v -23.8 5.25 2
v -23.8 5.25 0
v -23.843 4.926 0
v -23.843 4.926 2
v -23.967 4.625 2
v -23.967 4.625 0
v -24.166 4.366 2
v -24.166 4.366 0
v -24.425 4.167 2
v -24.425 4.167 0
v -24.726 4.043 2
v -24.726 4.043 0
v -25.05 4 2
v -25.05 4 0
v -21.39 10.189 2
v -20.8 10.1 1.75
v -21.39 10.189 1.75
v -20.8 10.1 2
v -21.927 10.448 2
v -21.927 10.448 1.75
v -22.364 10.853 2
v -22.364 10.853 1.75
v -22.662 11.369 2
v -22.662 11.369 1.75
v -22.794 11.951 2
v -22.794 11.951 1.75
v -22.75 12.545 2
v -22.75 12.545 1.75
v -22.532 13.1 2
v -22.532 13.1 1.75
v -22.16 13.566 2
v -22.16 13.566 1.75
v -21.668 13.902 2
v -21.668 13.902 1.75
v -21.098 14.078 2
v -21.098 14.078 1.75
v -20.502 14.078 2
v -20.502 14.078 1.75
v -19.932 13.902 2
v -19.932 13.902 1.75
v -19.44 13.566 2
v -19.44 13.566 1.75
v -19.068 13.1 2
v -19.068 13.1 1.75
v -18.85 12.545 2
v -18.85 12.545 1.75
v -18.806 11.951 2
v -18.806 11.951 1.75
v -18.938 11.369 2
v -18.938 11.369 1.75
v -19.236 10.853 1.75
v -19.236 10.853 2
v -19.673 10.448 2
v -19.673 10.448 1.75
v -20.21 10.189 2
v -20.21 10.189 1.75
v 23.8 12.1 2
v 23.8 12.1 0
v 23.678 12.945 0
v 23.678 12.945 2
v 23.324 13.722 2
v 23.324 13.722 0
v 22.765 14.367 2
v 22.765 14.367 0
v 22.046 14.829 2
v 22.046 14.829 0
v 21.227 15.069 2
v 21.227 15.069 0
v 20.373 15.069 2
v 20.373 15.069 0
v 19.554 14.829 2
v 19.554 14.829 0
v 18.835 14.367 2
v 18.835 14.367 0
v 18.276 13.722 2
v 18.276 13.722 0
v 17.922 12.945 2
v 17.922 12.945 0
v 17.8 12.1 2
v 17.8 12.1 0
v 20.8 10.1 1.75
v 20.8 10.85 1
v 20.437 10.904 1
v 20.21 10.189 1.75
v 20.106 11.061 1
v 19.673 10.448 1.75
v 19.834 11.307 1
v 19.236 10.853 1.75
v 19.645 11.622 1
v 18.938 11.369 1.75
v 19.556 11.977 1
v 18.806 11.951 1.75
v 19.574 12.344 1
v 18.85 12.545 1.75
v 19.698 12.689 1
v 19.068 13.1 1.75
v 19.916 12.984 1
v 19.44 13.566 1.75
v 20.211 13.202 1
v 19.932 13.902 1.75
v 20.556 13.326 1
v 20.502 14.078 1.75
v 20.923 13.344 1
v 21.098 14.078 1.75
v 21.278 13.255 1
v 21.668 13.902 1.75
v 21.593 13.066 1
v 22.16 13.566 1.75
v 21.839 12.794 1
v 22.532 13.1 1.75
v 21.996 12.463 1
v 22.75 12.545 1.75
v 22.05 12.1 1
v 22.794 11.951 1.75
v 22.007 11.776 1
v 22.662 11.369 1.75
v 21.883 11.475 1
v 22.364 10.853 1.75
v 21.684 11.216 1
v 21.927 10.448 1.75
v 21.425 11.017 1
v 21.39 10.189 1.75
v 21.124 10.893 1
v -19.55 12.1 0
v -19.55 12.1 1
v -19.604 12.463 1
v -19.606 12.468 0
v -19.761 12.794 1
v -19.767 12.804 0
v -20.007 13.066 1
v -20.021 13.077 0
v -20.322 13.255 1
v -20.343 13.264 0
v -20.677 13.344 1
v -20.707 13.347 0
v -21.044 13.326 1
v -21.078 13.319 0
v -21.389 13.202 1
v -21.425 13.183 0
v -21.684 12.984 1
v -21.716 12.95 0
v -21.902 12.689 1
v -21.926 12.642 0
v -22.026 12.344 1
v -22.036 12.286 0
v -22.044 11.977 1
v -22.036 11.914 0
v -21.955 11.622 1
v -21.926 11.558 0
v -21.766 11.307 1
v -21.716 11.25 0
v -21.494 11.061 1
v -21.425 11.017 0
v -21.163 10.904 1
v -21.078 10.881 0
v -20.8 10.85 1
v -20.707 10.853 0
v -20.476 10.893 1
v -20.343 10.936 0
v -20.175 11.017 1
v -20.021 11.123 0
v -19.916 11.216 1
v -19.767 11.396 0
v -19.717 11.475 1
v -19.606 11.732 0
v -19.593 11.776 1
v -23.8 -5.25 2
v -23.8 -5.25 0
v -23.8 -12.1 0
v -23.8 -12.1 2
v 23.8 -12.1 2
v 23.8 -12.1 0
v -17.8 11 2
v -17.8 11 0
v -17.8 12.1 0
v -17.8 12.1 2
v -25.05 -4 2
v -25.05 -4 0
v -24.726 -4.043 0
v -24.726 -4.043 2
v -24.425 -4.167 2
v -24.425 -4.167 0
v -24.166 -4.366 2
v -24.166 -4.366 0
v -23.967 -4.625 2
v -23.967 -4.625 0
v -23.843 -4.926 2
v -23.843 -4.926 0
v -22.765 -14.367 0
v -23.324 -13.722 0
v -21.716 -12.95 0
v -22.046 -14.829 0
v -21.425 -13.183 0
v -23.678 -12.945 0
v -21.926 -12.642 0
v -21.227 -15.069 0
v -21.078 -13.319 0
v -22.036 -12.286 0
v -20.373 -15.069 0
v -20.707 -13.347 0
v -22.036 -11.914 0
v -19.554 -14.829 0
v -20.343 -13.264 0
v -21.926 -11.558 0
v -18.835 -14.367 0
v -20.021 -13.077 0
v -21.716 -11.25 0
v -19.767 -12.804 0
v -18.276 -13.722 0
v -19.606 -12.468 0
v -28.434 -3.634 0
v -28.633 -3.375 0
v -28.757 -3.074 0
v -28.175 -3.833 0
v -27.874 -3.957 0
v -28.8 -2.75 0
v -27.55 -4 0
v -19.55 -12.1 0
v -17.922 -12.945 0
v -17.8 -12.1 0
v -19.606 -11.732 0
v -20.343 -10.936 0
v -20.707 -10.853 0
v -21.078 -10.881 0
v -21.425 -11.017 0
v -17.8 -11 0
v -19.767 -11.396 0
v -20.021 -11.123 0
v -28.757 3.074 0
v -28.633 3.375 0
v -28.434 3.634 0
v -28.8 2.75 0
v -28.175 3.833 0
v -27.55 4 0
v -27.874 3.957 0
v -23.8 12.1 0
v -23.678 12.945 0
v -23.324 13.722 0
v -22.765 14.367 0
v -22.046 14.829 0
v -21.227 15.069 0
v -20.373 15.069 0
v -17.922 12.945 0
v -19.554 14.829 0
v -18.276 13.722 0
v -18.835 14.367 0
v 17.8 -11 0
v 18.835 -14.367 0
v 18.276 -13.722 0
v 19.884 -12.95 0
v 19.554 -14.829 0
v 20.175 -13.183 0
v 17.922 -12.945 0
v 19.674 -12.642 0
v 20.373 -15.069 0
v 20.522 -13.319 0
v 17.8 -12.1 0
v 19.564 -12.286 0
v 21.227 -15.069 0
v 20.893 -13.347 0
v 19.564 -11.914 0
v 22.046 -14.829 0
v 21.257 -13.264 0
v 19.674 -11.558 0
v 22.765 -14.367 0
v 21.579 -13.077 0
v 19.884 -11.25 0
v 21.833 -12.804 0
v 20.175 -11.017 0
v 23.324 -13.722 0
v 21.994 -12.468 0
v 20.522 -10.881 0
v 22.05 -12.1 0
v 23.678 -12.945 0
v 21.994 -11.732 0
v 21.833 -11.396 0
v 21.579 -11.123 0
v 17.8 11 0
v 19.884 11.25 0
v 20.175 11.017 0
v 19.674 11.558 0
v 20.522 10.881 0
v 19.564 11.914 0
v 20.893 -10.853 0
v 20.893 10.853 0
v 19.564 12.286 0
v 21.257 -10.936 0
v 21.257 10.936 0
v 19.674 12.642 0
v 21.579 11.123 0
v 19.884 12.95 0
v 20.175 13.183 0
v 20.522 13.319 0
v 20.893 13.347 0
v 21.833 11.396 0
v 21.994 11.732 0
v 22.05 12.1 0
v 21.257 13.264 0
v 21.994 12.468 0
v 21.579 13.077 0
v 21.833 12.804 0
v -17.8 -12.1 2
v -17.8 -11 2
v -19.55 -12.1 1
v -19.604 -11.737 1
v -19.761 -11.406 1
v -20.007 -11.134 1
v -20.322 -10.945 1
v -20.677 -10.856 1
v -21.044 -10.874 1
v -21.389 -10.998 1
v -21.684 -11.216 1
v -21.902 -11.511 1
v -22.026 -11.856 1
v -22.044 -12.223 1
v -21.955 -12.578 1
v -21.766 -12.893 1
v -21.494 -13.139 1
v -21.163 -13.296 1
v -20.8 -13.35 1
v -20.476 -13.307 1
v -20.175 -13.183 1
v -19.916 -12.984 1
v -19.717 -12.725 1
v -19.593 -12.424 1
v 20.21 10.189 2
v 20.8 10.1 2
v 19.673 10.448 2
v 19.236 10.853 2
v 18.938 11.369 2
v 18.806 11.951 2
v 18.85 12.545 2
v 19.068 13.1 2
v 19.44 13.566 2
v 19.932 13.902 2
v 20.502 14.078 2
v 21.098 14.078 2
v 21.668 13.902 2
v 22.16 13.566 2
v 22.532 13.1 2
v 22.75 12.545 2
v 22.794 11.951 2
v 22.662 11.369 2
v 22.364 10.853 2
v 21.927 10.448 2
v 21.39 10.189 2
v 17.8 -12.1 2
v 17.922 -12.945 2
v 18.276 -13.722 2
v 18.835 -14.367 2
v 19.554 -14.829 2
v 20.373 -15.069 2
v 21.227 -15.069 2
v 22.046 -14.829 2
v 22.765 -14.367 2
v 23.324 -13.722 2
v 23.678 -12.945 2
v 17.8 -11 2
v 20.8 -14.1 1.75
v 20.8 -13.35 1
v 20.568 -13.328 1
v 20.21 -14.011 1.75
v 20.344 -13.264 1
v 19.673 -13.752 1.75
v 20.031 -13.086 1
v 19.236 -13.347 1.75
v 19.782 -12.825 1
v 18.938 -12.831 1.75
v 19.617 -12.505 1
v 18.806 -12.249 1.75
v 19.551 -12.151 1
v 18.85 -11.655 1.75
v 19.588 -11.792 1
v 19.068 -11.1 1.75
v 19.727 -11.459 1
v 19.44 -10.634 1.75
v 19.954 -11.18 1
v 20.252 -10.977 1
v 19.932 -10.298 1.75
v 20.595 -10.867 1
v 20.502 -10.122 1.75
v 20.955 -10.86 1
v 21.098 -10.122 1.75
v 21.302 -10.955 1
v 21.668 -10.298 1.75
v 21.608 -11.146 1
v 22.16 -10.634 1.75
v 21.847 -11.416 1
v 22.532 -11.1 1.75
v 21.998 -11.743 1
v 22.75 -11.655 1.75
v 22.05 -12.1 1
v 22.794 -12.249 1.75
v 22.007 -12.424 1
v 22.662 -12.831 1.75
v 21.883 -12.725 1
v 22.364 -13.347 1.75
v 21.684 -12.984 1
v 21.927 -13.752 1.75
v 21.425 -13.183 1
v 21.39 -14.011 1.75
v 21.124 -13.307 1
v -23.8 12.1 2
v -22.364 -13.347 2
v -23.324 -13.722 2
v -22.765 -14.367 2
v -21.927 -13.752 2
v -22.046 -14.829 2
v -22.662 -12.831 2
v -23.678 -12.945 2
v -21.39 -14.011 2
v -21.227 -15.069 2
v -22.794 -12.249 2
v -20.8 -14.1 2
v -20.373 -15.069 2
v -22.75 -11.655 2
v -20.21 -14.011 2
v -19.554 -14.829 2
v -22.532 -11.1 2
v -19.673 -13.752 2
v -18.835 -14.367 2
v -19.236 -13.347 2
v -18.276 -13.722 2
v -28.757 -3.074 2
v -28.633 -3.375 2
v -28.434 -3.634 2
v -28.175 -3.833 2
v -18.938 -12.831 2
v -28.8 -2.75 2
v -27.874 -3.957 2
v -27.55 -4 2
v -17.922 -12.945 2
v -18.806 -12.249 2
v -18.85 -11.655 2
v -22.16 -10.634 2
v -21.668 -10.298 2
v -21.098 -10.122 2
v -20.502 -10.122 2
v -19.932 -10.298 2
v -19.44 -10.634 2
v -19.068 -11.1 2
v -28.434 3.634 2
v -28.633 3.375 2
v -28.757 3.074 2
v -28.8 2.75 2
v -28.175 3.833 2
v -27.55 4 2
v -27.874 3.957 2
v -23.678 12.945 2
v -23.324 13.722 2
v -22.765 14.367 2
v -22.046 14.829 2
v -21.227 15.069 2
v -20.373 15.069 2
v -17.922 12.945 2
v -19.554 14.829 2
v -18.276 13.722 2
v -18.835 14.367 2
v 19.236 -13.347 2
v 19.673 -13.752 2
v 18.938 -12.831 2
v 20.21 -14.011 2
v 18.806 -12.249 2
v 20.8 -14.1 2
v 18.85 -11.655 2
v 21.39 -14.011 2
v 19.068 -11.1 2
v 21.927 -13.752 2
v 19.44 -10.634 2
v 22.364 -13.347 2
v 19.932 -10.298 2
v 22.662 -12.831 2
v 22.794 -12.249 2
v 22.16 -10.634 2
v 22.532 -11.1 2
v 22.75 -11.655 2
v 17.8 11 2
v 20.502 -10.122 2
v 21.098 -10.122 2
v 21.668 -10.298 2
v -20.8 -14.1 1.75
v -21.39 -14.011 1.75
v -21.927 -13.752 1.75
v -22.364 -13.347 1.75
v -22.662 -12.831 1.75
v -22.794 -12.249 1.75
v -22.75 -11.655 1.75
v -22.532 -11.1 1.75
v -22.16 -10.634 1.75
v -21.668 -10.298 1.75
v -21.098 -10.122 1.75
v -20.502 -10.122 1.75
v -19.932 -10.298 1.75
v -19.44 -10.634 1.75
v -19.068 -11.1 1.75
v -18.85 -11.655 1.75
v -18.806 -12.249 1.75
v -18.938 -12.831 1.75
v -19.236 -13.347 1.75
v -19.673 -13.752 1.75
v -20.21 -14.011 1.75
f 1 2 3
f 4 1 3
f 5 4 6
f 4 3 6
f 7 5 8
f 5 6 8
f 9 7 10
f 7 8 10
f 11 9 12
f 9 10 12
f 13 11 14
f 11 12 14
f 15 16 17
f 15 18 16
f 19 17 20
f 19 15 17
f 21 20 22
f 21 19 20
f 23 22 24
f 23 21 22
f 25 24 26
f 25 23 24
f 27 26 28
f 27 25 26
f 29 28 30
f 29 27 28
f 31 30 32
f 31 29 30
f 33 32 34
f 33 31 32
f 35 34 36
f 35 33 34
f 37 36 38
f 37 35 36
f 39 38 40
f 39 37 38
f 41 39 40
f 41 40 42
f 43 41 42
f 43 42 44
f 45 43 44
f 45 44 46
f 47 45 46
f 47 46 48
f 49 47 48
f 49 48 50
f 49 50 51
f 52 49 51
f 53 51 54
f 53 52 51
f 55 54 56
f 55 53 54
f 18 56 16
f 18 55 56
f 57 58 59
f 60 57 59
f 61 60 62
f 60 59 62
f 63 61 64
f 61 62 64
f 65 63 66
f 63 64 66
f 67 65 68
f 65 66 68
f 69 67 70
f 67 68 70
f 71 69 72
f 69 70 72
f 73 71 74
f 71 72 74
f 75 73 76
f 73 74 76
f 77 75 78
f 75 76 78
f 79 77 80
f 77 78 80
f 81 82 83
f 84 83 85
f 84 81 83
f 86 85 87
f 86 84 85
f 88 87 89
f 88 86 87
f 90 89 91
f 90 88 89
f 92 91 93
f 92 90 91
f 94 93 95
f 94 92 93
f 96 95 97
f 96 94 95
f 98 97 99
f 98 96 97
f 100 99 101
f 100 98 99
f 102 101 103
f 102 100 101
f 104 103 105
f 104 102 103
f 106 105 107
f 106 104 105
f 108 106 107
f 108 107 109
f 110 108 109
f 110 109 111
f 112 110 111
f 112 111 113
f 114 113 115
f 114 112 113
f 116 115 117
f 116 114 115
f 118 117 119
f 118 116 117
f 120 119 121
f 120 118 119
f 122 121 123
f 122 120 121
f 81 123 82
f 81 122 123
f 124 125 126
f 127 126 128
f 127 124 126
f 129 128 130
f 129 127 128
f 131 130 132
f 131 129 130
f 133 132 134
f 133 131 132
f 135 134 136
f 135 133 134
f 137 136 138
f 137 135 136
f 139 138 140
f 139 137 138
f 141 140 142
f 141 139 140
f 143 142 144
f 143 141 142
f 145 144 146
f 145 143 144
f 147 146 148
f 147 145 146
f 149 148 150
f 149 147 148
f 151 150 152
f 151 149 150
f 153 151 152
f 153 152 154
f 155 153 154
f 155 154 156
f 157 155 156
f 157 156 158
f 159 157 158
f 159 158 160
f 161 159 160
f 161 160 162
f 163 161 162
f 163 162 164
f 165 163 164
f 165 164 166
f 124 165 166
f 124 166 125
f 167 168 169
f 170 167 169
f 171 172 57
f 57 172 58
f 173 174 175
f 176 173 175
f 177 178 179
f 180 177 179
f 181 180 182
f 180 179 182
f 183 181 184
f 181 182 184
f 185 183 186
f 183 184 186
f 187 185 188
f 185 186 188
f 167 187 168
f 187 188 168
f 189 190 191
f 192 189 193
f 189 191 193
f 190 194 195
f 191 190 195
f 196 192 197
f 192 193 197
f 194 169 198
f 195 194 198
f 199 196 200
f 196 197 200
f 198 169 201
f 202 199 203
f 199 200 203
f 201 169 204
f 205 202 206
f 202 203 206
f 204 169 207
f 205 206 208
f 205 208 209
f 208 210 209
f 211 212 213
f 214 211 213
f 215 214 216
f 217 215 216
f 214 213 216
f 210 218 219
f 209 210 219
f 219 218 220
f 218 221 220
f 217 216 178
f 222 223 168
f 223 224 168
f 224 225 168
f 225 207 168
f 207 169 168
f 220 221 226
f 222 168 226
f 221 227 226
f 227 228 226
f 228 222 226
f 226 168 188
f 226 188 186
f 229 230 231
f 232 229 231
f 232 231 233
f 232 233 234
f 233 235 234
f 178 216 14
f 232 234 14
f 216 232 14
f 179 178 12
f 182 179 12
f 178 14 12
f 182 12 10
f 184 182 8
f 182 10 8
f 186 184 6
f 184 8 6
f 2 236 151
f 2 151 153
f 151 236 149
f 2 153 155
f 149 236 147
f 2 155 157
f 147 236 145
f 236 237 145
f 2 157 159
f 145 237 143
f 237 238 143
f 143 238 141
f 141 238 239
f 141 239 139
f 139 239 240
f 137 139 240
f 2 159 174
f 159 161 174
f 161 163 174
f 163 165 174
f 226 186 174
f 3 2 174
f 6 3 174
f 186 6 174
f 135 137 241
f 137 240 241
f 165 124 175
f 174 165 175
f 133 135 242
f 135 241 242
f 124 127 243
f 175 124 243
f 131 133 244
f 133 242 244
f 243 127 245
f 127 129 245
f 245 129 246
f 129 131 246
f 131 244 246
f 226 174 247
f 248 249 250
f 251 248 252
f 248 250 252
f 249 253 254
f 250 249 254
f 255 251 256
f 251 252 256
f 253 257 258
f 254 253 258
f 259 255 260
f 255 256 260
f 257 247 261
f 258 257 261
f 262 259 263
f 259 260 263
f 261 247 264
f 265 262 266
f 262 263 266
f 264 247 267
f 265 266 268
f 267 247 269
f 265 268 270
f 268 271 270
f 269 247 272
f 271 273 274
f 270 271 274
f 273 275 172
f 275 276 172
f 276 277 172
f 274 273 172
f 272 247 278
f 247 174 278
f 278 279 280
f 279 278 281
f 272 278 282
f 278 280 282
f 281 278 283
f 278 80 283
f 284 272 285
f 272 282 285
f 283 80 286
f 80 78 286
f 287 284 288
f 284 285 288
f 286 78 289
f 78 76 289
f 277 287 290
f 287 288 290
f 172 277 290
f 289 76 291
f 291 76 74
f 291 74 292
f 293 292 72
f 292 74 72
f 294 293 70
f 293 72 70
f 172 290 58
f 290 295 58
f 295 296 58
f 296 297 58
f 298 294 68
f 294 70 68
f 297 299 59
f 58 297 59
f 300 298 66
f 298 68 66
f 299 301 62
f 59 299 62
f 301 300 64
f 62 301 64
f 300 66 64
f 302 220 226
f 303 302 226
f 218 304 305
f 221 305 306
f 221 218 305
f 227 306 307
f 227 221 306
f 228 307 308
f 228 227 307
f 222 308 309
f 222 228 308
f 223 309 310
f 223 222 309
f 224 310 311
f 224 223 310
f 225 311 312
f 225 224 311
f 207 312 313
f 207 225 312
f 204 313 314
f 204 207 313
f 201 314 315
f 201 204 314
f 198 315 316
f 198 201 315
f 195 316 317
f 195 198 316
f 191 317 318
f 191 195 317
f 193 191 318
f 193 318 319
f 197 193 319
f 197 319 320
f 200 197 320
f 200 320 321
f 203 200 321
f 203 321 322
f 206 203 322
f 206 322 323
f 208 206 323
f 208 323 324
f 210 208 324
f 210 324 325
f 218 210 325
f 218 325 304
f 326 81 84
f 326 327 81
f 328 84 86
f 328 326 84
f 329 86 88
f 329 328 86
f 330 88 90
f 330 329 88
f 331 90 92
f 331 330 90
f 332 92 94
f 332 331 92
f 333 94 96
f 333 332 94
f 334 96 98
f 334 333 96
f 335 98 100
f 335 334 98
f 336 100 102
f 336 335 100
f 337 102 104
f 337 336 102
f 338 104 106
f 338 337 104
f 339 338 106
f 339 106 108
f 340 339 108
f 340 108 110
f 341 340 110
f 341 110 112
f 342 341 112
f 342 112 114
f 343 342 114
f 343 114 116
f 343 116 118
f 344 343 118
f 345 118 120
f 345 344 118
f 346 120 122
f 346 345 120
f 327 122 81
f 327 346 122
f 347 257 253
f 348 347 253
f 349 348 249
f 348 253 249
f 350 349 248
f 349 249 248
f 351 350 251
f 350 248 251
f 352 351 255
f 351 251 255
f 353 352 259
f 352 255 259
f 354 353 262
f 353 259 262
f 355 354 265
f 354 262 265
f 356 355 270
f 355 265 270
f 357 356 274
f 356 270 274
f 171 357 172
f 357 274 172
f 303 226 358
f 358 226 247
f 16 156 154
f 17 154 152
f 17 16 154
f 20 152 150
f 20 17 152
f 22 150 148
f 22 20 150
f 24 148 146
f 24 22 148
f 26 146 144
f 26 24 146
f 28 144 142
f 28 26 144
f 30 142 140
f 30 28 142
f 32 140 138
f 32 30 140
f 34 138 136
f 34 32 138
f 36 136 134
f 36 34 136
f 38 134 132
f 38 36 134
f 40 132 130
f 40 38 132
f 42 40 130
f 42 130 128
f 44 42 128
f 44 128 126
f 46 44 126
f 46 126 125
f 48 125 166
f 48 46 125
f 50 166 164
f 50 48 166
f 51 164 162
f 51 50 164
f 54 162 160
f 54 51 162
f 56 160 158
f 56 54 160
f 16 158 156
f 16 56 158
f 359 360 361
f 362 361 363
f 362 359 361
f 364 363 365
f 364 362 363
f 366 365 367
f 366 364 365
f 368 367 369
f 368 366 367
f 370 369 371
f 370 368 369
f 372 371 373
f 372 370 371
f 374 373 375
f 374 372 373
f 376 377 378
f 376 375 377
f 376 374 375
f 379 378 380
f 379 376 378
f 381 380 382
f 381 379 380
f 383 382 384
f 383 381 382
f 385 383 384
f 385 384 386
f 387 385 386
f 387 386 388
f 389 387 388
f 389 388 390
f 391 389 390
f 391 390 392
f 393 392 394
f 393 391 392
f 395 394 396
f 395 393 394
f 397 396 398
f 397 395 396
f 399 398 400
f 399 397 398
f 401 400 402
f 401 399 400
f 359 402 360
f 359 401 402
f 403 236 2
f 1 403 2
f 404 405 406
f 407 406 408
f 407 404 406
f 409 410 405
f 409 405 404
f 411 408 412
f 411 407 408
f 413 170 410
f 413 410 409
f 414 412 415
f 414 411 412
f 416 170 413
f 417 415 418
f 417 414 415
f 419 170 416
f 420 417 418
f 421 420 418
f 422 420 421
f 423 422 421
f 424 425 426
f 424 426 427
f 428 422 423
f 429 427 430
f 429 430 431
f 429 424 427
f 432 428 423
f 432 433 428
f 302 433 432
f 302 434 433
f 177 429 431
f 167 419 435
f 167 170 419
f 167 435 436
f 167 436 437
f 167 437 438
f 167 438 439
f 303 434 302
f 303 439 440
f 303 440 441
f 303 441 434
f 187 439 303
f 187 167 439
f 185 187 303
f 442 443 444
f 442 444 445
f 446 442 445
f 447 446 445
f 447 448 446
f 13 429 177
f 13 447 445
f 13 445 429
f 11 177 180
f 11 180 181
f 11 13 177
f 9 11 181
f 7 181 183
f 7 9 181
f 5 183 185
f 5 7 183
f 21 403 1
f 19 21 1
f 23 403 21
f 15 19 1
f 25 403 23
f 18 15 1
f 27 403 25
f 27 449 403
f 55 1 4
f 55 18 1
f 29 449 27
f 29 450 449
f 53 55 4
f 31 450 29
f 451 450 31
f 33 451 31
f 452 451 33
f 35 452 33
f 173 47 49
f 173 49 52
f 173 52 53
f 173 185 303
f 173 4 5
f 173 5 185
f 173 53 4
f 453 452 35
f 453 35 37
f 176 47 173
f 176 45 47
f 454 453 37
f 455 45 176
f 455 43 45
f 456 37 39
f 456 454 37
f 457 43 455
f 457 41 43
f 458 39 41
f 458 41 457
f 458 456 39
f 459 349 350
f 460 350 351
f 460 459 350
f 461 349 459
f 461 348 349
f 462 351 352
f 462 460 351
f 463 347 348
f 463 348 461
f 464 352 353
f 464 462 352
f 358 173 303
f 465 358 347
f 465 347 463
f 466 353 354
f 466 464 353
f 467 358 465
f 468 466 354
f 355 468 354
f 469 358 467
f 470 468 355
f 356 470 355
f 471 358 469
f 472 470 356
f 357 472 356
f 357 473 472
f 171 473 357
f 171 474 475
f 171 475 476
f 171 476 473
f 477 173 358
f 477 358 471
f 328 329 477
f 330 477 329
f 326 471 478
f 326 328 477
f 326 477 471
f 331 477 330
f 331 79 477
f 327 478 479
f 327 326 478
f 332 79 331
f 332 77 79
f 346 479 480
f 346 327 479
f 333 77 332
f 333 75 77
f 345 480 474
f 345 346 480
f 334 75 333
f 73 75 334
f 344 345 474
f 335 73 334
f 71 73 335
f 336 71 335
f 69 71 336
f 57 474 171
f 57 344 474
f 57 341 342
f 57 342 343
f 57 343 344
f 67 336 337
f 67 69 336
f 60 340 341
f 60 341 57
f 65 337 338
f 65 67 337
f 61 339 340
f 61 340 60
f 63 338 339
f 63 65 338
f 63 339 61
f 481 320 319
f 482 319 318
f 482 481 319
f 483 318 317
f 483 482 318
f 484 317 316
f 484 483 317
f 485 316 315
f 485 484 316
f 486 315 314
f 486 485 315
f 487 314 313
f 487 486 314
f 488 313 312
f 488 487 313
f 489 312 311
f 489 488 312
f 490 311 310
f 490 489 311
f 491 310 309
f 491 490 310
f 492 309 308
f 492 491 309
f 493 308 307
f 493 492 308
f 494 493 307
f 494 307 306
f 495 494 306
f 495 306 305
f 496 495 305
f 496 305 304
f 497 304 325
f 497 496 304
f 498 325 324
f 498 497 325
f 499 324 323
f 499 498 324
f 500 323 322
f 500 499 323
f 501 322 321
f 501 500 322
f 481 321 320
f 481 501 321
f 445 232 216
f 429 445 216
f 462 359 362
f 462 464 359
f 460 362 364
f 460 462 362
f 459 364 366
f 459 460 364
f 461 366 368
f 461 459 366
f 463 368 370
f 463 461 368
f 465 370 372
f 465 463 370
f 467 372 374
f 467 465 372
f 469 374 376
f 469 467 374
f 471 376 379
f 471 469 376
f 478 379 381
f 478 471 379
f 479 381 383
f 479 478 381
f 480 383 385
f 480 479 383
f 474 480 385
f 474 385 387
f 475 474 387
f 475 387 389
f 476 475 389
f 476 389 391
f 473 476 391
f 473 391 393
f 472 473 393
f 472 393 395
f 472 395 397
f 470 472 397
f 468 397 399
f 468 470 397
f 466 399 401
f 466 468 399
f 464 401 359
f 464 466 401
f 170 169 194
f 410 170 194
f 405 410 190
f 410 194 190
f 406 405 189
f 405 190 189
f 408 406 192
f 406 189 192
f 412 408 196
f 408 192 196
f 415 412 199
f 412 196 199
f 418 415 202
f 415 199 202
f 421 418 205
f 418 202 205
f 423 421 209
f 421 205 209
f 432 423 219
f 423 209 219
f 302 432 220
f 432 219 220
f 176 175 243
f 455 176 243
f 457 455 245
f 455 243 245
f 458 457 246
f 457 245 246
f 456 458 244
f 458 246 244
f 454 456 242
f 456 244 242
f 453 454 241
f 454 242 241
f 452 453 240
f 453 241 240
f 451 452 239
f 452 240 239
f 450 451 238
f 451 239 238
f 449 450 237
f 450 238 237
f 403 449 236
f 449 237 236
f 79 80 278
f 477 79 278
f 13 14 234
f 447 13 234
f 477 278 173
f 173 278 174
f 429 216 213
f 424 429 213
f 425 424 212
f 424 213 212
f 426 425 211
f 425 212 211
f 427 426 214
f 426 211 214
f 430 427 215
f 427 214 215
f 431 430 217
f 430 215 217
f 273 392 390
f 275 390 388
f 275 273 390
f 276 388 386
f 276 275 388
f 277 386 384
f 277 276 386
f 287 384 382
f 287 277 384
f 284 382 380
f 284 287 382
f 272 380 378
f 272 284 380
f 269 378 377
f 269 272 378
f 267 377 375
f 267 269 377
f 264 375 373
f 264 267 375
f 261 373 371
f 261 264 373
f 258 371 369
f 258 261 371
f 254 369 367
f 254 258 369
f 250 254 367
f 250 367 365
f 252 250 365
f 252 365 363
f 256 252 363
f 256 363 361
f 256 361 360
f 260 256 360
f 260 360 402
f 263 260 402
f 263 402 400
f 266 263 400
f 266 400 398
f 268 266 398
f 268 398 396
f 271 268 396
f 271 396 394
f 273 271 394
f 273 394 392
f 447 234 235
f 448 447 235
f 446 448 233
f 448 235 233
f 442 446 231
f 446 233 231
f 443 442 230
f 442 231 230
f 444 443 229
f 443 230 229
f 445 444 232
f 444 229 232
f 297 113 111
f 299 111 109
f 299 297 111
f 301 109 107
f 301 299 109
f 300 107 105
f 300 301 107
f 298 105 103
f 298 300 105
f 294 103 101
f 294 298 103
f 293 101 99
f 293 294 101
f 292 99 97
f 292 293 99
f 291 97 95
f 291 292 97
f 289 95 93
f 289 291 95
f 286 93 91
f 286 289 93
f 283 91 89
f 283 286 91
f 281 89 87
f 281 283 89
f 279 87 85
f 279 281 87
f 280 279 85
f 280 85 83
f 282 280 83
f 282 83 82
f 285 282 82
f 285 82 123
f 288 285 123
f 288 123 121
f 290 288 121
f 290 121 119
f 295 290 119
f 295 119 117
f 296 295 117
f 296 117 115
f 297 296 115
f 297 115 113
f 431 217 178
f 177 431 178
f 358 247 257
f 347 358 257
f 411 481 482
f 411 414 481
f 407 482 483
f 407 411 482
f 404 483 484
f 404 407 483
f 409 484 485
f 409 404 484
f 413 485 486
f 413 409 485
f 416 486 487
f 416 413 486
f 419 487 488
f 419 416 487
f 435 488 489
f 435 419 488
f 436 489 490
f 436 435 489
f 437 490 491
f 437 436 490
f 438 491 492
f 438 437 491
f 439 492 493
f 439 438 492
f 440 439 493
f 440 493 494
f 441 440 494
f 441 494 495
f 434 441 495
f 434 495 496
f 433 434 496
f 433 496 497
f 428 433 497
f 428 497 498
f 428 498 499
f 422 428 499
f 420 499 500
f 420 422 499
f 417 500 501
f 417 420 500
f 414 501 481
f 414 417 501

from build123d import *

# Parameters (mm, degrees)
SKETCH1_R                                      = 1.25
BOSS_EXTRUDE1_DEPTH                            = 2
CSK_FOR_M2_FLAT_HEAD_MACHINE_SCREW1_AT_2_COUNT = 2
CSK_FOR_M2_FLAT_HEAD_MACHINE_SCREW1_AT_2_PITCH = 41.6
CSK_FOR_M2_FLAT_HEAD_MACHINE_SCREW1_AT_3_COUNT = 2
CSK_FOR_M2_FLAT_HEAD_MACHINE_SCREW1_AT_3_PITCH = 48.126915546
CSK_FOR_M2_FLAT_HEAD_MACHINE_SCREW1_AT_4_COUNT = 2
CSK_FOR_M2_FLAT_HEAD_MACHINE_SCREW1_AT_4_PITCH = 24.2


with BuildPart() as part:
    # Sketch1 → Boss-Extrude1 (new body)
    with BuildSketch(Plane.XY):
        with BuildLine():
            Line((-28.8, 2.25), (-28.8, -2.25))
            Line((-28.8, -2.25), (-28.8, -2.75))
            ThreePointArc((-28.8, -2.75), (-28.433883476, -3.633883476), (-27.55, -4))
            Line((-27.55, -4), (-25.05, -4))
            ThreePointArc((-25.05, -4), (-24.166116524, -4.366116524), (-23.8, -5.25))
            Line((-23.8, -5.25), (-23.8, -12.1))
            ThreePointArc((-23.8, -12.1), (-20.8, -15.1), (-17.8, -12.1))
            Line((-17.8, -12.1), (-17.8, -11))
            Line((-17.8, -11), (17.8, -11))
            Line((17.8, -11), (17.8, -12.1))
            ThreePointArc((17.8, -12.1), (20.8, -15.1), (23.8, -12.1))
            Line((23.8, -12.1), (23.8, 12.1))
            ThreePointArc((23.8, 12.1), (20.8, 15.1), (17.8, 12.1))
            Line((17.8, 12.1), (17.8, 11))
            Line((17.8, 11), (-17.8, 11))
            Line((-17.8, 11), (-17.8, 12.1))
            ThreePointArc((-17.8, 12.1), (-20.8, 15.1), (-23.8, 12.1))
            Line((-23.8, 12.1), (-23.8, 5.25))
            ThreePointArc((-23.8, 5.25), (-24.166116524, 4.366116524), (-25.05, 4))
            Line((-25.05, 4), (-27.55, 4))
            ThreePointArc((-27.55, 4), (-28.433883476, 3.633883476), (-28.8, 2.75))
            Line((-28.8, 2.75), (-28.8, 2.25))
        make_face()
        with Locations((-20.8, 12.1)):
            Circle(SKETCH1_R, mode=Mode.SUBTRACT)
        with Locations((20.8, 12.1)):
            Circle(SKETCH1_R, mode=Mode.SUBTRACT)
        with Locations((20.8, -12.1)):
            Circle(SKETCH1_R, mode=Mode.SUBTRACT)
        with Locations((-20.8, -12.1)):
            Circle(SKETCH1_R, mode=Mode.SUBTRACT)
    extrude(amount=BOSS_EXTRUDE1_DEPTH)

    # Sketch3 → CSK for M2 Flat Head Machine Screw1 (revolve, cut)
    with BuildSketch(Plane(origin=(-20.8, 12.1, 2), x_dir=(0, -1, 0), z_dir=(1, 0, 0))):
        Polygon((0, 0), (0, 4.400860619), (1, 3.8), (1, 1.25), (2, 0.25), (2, 0), align=None)
    csk_for_m2_flat_head_machine_screw1 = revolve(axis=Axis((-20.8, 12.1, 8.35), (0, 0, -1)), mode=Mode.SUBTRACT)

    # CSK for M2 Flat Head Machine Screw1 at 2: CSK for M2 Flat Head Machine Screw1 ×2
    with Locations(*[(i * CSK_FOR_M2_FLAT_HEAD_MACHINE_SCREW1_AT_2_PITCH, 0, 0) for i in range(1, CSK_FOR_M2_FLAT_HEAD_MACHINE_SCREW1_AT_2_COUNT)]):
        add(csk_for_m2_flat_head_machine_screw1, mode=Mode.SUBTRACT)

    # CSK for M2 Flat Head Machine Screw1 at 3: CSK for M2 Flat Head Machine Screw1 ×2
    with Locations(*[Vector(0.864381179, -0.502837128, 0) * (i * CSK_FOR_M2_FLAT_HEAD_MACHINE_SCREW1_AT_3_PITCH) for i in range(1, CSK_FOR_M2_FLAT_HEAD_MACHINE_SCREW1_AT_3_COUNT)]):
        add(csk_for_m2_flat_head_machine_screw1, mode=Mode.SUBTRACT)

    # CSK for M2 Flat Head Machine Screw1 at 4: CSK for M2 Flat Head Machine Screw1 ×2
    with Locations(*[(0, -i * CSK_FOR_M2_FLAT_HEAD_MACHINE_SCREW1_AT_4_PITCH, 0) for i in range(1, CSK_FOR_M2_FLAT_HEAD_MACHINE_SCREW1_AT_4_COUNT)]):
        add(csk_for_m2_flat_head_machine_screw1, mode=Mode.SUBTRACT)


solid = part.part
